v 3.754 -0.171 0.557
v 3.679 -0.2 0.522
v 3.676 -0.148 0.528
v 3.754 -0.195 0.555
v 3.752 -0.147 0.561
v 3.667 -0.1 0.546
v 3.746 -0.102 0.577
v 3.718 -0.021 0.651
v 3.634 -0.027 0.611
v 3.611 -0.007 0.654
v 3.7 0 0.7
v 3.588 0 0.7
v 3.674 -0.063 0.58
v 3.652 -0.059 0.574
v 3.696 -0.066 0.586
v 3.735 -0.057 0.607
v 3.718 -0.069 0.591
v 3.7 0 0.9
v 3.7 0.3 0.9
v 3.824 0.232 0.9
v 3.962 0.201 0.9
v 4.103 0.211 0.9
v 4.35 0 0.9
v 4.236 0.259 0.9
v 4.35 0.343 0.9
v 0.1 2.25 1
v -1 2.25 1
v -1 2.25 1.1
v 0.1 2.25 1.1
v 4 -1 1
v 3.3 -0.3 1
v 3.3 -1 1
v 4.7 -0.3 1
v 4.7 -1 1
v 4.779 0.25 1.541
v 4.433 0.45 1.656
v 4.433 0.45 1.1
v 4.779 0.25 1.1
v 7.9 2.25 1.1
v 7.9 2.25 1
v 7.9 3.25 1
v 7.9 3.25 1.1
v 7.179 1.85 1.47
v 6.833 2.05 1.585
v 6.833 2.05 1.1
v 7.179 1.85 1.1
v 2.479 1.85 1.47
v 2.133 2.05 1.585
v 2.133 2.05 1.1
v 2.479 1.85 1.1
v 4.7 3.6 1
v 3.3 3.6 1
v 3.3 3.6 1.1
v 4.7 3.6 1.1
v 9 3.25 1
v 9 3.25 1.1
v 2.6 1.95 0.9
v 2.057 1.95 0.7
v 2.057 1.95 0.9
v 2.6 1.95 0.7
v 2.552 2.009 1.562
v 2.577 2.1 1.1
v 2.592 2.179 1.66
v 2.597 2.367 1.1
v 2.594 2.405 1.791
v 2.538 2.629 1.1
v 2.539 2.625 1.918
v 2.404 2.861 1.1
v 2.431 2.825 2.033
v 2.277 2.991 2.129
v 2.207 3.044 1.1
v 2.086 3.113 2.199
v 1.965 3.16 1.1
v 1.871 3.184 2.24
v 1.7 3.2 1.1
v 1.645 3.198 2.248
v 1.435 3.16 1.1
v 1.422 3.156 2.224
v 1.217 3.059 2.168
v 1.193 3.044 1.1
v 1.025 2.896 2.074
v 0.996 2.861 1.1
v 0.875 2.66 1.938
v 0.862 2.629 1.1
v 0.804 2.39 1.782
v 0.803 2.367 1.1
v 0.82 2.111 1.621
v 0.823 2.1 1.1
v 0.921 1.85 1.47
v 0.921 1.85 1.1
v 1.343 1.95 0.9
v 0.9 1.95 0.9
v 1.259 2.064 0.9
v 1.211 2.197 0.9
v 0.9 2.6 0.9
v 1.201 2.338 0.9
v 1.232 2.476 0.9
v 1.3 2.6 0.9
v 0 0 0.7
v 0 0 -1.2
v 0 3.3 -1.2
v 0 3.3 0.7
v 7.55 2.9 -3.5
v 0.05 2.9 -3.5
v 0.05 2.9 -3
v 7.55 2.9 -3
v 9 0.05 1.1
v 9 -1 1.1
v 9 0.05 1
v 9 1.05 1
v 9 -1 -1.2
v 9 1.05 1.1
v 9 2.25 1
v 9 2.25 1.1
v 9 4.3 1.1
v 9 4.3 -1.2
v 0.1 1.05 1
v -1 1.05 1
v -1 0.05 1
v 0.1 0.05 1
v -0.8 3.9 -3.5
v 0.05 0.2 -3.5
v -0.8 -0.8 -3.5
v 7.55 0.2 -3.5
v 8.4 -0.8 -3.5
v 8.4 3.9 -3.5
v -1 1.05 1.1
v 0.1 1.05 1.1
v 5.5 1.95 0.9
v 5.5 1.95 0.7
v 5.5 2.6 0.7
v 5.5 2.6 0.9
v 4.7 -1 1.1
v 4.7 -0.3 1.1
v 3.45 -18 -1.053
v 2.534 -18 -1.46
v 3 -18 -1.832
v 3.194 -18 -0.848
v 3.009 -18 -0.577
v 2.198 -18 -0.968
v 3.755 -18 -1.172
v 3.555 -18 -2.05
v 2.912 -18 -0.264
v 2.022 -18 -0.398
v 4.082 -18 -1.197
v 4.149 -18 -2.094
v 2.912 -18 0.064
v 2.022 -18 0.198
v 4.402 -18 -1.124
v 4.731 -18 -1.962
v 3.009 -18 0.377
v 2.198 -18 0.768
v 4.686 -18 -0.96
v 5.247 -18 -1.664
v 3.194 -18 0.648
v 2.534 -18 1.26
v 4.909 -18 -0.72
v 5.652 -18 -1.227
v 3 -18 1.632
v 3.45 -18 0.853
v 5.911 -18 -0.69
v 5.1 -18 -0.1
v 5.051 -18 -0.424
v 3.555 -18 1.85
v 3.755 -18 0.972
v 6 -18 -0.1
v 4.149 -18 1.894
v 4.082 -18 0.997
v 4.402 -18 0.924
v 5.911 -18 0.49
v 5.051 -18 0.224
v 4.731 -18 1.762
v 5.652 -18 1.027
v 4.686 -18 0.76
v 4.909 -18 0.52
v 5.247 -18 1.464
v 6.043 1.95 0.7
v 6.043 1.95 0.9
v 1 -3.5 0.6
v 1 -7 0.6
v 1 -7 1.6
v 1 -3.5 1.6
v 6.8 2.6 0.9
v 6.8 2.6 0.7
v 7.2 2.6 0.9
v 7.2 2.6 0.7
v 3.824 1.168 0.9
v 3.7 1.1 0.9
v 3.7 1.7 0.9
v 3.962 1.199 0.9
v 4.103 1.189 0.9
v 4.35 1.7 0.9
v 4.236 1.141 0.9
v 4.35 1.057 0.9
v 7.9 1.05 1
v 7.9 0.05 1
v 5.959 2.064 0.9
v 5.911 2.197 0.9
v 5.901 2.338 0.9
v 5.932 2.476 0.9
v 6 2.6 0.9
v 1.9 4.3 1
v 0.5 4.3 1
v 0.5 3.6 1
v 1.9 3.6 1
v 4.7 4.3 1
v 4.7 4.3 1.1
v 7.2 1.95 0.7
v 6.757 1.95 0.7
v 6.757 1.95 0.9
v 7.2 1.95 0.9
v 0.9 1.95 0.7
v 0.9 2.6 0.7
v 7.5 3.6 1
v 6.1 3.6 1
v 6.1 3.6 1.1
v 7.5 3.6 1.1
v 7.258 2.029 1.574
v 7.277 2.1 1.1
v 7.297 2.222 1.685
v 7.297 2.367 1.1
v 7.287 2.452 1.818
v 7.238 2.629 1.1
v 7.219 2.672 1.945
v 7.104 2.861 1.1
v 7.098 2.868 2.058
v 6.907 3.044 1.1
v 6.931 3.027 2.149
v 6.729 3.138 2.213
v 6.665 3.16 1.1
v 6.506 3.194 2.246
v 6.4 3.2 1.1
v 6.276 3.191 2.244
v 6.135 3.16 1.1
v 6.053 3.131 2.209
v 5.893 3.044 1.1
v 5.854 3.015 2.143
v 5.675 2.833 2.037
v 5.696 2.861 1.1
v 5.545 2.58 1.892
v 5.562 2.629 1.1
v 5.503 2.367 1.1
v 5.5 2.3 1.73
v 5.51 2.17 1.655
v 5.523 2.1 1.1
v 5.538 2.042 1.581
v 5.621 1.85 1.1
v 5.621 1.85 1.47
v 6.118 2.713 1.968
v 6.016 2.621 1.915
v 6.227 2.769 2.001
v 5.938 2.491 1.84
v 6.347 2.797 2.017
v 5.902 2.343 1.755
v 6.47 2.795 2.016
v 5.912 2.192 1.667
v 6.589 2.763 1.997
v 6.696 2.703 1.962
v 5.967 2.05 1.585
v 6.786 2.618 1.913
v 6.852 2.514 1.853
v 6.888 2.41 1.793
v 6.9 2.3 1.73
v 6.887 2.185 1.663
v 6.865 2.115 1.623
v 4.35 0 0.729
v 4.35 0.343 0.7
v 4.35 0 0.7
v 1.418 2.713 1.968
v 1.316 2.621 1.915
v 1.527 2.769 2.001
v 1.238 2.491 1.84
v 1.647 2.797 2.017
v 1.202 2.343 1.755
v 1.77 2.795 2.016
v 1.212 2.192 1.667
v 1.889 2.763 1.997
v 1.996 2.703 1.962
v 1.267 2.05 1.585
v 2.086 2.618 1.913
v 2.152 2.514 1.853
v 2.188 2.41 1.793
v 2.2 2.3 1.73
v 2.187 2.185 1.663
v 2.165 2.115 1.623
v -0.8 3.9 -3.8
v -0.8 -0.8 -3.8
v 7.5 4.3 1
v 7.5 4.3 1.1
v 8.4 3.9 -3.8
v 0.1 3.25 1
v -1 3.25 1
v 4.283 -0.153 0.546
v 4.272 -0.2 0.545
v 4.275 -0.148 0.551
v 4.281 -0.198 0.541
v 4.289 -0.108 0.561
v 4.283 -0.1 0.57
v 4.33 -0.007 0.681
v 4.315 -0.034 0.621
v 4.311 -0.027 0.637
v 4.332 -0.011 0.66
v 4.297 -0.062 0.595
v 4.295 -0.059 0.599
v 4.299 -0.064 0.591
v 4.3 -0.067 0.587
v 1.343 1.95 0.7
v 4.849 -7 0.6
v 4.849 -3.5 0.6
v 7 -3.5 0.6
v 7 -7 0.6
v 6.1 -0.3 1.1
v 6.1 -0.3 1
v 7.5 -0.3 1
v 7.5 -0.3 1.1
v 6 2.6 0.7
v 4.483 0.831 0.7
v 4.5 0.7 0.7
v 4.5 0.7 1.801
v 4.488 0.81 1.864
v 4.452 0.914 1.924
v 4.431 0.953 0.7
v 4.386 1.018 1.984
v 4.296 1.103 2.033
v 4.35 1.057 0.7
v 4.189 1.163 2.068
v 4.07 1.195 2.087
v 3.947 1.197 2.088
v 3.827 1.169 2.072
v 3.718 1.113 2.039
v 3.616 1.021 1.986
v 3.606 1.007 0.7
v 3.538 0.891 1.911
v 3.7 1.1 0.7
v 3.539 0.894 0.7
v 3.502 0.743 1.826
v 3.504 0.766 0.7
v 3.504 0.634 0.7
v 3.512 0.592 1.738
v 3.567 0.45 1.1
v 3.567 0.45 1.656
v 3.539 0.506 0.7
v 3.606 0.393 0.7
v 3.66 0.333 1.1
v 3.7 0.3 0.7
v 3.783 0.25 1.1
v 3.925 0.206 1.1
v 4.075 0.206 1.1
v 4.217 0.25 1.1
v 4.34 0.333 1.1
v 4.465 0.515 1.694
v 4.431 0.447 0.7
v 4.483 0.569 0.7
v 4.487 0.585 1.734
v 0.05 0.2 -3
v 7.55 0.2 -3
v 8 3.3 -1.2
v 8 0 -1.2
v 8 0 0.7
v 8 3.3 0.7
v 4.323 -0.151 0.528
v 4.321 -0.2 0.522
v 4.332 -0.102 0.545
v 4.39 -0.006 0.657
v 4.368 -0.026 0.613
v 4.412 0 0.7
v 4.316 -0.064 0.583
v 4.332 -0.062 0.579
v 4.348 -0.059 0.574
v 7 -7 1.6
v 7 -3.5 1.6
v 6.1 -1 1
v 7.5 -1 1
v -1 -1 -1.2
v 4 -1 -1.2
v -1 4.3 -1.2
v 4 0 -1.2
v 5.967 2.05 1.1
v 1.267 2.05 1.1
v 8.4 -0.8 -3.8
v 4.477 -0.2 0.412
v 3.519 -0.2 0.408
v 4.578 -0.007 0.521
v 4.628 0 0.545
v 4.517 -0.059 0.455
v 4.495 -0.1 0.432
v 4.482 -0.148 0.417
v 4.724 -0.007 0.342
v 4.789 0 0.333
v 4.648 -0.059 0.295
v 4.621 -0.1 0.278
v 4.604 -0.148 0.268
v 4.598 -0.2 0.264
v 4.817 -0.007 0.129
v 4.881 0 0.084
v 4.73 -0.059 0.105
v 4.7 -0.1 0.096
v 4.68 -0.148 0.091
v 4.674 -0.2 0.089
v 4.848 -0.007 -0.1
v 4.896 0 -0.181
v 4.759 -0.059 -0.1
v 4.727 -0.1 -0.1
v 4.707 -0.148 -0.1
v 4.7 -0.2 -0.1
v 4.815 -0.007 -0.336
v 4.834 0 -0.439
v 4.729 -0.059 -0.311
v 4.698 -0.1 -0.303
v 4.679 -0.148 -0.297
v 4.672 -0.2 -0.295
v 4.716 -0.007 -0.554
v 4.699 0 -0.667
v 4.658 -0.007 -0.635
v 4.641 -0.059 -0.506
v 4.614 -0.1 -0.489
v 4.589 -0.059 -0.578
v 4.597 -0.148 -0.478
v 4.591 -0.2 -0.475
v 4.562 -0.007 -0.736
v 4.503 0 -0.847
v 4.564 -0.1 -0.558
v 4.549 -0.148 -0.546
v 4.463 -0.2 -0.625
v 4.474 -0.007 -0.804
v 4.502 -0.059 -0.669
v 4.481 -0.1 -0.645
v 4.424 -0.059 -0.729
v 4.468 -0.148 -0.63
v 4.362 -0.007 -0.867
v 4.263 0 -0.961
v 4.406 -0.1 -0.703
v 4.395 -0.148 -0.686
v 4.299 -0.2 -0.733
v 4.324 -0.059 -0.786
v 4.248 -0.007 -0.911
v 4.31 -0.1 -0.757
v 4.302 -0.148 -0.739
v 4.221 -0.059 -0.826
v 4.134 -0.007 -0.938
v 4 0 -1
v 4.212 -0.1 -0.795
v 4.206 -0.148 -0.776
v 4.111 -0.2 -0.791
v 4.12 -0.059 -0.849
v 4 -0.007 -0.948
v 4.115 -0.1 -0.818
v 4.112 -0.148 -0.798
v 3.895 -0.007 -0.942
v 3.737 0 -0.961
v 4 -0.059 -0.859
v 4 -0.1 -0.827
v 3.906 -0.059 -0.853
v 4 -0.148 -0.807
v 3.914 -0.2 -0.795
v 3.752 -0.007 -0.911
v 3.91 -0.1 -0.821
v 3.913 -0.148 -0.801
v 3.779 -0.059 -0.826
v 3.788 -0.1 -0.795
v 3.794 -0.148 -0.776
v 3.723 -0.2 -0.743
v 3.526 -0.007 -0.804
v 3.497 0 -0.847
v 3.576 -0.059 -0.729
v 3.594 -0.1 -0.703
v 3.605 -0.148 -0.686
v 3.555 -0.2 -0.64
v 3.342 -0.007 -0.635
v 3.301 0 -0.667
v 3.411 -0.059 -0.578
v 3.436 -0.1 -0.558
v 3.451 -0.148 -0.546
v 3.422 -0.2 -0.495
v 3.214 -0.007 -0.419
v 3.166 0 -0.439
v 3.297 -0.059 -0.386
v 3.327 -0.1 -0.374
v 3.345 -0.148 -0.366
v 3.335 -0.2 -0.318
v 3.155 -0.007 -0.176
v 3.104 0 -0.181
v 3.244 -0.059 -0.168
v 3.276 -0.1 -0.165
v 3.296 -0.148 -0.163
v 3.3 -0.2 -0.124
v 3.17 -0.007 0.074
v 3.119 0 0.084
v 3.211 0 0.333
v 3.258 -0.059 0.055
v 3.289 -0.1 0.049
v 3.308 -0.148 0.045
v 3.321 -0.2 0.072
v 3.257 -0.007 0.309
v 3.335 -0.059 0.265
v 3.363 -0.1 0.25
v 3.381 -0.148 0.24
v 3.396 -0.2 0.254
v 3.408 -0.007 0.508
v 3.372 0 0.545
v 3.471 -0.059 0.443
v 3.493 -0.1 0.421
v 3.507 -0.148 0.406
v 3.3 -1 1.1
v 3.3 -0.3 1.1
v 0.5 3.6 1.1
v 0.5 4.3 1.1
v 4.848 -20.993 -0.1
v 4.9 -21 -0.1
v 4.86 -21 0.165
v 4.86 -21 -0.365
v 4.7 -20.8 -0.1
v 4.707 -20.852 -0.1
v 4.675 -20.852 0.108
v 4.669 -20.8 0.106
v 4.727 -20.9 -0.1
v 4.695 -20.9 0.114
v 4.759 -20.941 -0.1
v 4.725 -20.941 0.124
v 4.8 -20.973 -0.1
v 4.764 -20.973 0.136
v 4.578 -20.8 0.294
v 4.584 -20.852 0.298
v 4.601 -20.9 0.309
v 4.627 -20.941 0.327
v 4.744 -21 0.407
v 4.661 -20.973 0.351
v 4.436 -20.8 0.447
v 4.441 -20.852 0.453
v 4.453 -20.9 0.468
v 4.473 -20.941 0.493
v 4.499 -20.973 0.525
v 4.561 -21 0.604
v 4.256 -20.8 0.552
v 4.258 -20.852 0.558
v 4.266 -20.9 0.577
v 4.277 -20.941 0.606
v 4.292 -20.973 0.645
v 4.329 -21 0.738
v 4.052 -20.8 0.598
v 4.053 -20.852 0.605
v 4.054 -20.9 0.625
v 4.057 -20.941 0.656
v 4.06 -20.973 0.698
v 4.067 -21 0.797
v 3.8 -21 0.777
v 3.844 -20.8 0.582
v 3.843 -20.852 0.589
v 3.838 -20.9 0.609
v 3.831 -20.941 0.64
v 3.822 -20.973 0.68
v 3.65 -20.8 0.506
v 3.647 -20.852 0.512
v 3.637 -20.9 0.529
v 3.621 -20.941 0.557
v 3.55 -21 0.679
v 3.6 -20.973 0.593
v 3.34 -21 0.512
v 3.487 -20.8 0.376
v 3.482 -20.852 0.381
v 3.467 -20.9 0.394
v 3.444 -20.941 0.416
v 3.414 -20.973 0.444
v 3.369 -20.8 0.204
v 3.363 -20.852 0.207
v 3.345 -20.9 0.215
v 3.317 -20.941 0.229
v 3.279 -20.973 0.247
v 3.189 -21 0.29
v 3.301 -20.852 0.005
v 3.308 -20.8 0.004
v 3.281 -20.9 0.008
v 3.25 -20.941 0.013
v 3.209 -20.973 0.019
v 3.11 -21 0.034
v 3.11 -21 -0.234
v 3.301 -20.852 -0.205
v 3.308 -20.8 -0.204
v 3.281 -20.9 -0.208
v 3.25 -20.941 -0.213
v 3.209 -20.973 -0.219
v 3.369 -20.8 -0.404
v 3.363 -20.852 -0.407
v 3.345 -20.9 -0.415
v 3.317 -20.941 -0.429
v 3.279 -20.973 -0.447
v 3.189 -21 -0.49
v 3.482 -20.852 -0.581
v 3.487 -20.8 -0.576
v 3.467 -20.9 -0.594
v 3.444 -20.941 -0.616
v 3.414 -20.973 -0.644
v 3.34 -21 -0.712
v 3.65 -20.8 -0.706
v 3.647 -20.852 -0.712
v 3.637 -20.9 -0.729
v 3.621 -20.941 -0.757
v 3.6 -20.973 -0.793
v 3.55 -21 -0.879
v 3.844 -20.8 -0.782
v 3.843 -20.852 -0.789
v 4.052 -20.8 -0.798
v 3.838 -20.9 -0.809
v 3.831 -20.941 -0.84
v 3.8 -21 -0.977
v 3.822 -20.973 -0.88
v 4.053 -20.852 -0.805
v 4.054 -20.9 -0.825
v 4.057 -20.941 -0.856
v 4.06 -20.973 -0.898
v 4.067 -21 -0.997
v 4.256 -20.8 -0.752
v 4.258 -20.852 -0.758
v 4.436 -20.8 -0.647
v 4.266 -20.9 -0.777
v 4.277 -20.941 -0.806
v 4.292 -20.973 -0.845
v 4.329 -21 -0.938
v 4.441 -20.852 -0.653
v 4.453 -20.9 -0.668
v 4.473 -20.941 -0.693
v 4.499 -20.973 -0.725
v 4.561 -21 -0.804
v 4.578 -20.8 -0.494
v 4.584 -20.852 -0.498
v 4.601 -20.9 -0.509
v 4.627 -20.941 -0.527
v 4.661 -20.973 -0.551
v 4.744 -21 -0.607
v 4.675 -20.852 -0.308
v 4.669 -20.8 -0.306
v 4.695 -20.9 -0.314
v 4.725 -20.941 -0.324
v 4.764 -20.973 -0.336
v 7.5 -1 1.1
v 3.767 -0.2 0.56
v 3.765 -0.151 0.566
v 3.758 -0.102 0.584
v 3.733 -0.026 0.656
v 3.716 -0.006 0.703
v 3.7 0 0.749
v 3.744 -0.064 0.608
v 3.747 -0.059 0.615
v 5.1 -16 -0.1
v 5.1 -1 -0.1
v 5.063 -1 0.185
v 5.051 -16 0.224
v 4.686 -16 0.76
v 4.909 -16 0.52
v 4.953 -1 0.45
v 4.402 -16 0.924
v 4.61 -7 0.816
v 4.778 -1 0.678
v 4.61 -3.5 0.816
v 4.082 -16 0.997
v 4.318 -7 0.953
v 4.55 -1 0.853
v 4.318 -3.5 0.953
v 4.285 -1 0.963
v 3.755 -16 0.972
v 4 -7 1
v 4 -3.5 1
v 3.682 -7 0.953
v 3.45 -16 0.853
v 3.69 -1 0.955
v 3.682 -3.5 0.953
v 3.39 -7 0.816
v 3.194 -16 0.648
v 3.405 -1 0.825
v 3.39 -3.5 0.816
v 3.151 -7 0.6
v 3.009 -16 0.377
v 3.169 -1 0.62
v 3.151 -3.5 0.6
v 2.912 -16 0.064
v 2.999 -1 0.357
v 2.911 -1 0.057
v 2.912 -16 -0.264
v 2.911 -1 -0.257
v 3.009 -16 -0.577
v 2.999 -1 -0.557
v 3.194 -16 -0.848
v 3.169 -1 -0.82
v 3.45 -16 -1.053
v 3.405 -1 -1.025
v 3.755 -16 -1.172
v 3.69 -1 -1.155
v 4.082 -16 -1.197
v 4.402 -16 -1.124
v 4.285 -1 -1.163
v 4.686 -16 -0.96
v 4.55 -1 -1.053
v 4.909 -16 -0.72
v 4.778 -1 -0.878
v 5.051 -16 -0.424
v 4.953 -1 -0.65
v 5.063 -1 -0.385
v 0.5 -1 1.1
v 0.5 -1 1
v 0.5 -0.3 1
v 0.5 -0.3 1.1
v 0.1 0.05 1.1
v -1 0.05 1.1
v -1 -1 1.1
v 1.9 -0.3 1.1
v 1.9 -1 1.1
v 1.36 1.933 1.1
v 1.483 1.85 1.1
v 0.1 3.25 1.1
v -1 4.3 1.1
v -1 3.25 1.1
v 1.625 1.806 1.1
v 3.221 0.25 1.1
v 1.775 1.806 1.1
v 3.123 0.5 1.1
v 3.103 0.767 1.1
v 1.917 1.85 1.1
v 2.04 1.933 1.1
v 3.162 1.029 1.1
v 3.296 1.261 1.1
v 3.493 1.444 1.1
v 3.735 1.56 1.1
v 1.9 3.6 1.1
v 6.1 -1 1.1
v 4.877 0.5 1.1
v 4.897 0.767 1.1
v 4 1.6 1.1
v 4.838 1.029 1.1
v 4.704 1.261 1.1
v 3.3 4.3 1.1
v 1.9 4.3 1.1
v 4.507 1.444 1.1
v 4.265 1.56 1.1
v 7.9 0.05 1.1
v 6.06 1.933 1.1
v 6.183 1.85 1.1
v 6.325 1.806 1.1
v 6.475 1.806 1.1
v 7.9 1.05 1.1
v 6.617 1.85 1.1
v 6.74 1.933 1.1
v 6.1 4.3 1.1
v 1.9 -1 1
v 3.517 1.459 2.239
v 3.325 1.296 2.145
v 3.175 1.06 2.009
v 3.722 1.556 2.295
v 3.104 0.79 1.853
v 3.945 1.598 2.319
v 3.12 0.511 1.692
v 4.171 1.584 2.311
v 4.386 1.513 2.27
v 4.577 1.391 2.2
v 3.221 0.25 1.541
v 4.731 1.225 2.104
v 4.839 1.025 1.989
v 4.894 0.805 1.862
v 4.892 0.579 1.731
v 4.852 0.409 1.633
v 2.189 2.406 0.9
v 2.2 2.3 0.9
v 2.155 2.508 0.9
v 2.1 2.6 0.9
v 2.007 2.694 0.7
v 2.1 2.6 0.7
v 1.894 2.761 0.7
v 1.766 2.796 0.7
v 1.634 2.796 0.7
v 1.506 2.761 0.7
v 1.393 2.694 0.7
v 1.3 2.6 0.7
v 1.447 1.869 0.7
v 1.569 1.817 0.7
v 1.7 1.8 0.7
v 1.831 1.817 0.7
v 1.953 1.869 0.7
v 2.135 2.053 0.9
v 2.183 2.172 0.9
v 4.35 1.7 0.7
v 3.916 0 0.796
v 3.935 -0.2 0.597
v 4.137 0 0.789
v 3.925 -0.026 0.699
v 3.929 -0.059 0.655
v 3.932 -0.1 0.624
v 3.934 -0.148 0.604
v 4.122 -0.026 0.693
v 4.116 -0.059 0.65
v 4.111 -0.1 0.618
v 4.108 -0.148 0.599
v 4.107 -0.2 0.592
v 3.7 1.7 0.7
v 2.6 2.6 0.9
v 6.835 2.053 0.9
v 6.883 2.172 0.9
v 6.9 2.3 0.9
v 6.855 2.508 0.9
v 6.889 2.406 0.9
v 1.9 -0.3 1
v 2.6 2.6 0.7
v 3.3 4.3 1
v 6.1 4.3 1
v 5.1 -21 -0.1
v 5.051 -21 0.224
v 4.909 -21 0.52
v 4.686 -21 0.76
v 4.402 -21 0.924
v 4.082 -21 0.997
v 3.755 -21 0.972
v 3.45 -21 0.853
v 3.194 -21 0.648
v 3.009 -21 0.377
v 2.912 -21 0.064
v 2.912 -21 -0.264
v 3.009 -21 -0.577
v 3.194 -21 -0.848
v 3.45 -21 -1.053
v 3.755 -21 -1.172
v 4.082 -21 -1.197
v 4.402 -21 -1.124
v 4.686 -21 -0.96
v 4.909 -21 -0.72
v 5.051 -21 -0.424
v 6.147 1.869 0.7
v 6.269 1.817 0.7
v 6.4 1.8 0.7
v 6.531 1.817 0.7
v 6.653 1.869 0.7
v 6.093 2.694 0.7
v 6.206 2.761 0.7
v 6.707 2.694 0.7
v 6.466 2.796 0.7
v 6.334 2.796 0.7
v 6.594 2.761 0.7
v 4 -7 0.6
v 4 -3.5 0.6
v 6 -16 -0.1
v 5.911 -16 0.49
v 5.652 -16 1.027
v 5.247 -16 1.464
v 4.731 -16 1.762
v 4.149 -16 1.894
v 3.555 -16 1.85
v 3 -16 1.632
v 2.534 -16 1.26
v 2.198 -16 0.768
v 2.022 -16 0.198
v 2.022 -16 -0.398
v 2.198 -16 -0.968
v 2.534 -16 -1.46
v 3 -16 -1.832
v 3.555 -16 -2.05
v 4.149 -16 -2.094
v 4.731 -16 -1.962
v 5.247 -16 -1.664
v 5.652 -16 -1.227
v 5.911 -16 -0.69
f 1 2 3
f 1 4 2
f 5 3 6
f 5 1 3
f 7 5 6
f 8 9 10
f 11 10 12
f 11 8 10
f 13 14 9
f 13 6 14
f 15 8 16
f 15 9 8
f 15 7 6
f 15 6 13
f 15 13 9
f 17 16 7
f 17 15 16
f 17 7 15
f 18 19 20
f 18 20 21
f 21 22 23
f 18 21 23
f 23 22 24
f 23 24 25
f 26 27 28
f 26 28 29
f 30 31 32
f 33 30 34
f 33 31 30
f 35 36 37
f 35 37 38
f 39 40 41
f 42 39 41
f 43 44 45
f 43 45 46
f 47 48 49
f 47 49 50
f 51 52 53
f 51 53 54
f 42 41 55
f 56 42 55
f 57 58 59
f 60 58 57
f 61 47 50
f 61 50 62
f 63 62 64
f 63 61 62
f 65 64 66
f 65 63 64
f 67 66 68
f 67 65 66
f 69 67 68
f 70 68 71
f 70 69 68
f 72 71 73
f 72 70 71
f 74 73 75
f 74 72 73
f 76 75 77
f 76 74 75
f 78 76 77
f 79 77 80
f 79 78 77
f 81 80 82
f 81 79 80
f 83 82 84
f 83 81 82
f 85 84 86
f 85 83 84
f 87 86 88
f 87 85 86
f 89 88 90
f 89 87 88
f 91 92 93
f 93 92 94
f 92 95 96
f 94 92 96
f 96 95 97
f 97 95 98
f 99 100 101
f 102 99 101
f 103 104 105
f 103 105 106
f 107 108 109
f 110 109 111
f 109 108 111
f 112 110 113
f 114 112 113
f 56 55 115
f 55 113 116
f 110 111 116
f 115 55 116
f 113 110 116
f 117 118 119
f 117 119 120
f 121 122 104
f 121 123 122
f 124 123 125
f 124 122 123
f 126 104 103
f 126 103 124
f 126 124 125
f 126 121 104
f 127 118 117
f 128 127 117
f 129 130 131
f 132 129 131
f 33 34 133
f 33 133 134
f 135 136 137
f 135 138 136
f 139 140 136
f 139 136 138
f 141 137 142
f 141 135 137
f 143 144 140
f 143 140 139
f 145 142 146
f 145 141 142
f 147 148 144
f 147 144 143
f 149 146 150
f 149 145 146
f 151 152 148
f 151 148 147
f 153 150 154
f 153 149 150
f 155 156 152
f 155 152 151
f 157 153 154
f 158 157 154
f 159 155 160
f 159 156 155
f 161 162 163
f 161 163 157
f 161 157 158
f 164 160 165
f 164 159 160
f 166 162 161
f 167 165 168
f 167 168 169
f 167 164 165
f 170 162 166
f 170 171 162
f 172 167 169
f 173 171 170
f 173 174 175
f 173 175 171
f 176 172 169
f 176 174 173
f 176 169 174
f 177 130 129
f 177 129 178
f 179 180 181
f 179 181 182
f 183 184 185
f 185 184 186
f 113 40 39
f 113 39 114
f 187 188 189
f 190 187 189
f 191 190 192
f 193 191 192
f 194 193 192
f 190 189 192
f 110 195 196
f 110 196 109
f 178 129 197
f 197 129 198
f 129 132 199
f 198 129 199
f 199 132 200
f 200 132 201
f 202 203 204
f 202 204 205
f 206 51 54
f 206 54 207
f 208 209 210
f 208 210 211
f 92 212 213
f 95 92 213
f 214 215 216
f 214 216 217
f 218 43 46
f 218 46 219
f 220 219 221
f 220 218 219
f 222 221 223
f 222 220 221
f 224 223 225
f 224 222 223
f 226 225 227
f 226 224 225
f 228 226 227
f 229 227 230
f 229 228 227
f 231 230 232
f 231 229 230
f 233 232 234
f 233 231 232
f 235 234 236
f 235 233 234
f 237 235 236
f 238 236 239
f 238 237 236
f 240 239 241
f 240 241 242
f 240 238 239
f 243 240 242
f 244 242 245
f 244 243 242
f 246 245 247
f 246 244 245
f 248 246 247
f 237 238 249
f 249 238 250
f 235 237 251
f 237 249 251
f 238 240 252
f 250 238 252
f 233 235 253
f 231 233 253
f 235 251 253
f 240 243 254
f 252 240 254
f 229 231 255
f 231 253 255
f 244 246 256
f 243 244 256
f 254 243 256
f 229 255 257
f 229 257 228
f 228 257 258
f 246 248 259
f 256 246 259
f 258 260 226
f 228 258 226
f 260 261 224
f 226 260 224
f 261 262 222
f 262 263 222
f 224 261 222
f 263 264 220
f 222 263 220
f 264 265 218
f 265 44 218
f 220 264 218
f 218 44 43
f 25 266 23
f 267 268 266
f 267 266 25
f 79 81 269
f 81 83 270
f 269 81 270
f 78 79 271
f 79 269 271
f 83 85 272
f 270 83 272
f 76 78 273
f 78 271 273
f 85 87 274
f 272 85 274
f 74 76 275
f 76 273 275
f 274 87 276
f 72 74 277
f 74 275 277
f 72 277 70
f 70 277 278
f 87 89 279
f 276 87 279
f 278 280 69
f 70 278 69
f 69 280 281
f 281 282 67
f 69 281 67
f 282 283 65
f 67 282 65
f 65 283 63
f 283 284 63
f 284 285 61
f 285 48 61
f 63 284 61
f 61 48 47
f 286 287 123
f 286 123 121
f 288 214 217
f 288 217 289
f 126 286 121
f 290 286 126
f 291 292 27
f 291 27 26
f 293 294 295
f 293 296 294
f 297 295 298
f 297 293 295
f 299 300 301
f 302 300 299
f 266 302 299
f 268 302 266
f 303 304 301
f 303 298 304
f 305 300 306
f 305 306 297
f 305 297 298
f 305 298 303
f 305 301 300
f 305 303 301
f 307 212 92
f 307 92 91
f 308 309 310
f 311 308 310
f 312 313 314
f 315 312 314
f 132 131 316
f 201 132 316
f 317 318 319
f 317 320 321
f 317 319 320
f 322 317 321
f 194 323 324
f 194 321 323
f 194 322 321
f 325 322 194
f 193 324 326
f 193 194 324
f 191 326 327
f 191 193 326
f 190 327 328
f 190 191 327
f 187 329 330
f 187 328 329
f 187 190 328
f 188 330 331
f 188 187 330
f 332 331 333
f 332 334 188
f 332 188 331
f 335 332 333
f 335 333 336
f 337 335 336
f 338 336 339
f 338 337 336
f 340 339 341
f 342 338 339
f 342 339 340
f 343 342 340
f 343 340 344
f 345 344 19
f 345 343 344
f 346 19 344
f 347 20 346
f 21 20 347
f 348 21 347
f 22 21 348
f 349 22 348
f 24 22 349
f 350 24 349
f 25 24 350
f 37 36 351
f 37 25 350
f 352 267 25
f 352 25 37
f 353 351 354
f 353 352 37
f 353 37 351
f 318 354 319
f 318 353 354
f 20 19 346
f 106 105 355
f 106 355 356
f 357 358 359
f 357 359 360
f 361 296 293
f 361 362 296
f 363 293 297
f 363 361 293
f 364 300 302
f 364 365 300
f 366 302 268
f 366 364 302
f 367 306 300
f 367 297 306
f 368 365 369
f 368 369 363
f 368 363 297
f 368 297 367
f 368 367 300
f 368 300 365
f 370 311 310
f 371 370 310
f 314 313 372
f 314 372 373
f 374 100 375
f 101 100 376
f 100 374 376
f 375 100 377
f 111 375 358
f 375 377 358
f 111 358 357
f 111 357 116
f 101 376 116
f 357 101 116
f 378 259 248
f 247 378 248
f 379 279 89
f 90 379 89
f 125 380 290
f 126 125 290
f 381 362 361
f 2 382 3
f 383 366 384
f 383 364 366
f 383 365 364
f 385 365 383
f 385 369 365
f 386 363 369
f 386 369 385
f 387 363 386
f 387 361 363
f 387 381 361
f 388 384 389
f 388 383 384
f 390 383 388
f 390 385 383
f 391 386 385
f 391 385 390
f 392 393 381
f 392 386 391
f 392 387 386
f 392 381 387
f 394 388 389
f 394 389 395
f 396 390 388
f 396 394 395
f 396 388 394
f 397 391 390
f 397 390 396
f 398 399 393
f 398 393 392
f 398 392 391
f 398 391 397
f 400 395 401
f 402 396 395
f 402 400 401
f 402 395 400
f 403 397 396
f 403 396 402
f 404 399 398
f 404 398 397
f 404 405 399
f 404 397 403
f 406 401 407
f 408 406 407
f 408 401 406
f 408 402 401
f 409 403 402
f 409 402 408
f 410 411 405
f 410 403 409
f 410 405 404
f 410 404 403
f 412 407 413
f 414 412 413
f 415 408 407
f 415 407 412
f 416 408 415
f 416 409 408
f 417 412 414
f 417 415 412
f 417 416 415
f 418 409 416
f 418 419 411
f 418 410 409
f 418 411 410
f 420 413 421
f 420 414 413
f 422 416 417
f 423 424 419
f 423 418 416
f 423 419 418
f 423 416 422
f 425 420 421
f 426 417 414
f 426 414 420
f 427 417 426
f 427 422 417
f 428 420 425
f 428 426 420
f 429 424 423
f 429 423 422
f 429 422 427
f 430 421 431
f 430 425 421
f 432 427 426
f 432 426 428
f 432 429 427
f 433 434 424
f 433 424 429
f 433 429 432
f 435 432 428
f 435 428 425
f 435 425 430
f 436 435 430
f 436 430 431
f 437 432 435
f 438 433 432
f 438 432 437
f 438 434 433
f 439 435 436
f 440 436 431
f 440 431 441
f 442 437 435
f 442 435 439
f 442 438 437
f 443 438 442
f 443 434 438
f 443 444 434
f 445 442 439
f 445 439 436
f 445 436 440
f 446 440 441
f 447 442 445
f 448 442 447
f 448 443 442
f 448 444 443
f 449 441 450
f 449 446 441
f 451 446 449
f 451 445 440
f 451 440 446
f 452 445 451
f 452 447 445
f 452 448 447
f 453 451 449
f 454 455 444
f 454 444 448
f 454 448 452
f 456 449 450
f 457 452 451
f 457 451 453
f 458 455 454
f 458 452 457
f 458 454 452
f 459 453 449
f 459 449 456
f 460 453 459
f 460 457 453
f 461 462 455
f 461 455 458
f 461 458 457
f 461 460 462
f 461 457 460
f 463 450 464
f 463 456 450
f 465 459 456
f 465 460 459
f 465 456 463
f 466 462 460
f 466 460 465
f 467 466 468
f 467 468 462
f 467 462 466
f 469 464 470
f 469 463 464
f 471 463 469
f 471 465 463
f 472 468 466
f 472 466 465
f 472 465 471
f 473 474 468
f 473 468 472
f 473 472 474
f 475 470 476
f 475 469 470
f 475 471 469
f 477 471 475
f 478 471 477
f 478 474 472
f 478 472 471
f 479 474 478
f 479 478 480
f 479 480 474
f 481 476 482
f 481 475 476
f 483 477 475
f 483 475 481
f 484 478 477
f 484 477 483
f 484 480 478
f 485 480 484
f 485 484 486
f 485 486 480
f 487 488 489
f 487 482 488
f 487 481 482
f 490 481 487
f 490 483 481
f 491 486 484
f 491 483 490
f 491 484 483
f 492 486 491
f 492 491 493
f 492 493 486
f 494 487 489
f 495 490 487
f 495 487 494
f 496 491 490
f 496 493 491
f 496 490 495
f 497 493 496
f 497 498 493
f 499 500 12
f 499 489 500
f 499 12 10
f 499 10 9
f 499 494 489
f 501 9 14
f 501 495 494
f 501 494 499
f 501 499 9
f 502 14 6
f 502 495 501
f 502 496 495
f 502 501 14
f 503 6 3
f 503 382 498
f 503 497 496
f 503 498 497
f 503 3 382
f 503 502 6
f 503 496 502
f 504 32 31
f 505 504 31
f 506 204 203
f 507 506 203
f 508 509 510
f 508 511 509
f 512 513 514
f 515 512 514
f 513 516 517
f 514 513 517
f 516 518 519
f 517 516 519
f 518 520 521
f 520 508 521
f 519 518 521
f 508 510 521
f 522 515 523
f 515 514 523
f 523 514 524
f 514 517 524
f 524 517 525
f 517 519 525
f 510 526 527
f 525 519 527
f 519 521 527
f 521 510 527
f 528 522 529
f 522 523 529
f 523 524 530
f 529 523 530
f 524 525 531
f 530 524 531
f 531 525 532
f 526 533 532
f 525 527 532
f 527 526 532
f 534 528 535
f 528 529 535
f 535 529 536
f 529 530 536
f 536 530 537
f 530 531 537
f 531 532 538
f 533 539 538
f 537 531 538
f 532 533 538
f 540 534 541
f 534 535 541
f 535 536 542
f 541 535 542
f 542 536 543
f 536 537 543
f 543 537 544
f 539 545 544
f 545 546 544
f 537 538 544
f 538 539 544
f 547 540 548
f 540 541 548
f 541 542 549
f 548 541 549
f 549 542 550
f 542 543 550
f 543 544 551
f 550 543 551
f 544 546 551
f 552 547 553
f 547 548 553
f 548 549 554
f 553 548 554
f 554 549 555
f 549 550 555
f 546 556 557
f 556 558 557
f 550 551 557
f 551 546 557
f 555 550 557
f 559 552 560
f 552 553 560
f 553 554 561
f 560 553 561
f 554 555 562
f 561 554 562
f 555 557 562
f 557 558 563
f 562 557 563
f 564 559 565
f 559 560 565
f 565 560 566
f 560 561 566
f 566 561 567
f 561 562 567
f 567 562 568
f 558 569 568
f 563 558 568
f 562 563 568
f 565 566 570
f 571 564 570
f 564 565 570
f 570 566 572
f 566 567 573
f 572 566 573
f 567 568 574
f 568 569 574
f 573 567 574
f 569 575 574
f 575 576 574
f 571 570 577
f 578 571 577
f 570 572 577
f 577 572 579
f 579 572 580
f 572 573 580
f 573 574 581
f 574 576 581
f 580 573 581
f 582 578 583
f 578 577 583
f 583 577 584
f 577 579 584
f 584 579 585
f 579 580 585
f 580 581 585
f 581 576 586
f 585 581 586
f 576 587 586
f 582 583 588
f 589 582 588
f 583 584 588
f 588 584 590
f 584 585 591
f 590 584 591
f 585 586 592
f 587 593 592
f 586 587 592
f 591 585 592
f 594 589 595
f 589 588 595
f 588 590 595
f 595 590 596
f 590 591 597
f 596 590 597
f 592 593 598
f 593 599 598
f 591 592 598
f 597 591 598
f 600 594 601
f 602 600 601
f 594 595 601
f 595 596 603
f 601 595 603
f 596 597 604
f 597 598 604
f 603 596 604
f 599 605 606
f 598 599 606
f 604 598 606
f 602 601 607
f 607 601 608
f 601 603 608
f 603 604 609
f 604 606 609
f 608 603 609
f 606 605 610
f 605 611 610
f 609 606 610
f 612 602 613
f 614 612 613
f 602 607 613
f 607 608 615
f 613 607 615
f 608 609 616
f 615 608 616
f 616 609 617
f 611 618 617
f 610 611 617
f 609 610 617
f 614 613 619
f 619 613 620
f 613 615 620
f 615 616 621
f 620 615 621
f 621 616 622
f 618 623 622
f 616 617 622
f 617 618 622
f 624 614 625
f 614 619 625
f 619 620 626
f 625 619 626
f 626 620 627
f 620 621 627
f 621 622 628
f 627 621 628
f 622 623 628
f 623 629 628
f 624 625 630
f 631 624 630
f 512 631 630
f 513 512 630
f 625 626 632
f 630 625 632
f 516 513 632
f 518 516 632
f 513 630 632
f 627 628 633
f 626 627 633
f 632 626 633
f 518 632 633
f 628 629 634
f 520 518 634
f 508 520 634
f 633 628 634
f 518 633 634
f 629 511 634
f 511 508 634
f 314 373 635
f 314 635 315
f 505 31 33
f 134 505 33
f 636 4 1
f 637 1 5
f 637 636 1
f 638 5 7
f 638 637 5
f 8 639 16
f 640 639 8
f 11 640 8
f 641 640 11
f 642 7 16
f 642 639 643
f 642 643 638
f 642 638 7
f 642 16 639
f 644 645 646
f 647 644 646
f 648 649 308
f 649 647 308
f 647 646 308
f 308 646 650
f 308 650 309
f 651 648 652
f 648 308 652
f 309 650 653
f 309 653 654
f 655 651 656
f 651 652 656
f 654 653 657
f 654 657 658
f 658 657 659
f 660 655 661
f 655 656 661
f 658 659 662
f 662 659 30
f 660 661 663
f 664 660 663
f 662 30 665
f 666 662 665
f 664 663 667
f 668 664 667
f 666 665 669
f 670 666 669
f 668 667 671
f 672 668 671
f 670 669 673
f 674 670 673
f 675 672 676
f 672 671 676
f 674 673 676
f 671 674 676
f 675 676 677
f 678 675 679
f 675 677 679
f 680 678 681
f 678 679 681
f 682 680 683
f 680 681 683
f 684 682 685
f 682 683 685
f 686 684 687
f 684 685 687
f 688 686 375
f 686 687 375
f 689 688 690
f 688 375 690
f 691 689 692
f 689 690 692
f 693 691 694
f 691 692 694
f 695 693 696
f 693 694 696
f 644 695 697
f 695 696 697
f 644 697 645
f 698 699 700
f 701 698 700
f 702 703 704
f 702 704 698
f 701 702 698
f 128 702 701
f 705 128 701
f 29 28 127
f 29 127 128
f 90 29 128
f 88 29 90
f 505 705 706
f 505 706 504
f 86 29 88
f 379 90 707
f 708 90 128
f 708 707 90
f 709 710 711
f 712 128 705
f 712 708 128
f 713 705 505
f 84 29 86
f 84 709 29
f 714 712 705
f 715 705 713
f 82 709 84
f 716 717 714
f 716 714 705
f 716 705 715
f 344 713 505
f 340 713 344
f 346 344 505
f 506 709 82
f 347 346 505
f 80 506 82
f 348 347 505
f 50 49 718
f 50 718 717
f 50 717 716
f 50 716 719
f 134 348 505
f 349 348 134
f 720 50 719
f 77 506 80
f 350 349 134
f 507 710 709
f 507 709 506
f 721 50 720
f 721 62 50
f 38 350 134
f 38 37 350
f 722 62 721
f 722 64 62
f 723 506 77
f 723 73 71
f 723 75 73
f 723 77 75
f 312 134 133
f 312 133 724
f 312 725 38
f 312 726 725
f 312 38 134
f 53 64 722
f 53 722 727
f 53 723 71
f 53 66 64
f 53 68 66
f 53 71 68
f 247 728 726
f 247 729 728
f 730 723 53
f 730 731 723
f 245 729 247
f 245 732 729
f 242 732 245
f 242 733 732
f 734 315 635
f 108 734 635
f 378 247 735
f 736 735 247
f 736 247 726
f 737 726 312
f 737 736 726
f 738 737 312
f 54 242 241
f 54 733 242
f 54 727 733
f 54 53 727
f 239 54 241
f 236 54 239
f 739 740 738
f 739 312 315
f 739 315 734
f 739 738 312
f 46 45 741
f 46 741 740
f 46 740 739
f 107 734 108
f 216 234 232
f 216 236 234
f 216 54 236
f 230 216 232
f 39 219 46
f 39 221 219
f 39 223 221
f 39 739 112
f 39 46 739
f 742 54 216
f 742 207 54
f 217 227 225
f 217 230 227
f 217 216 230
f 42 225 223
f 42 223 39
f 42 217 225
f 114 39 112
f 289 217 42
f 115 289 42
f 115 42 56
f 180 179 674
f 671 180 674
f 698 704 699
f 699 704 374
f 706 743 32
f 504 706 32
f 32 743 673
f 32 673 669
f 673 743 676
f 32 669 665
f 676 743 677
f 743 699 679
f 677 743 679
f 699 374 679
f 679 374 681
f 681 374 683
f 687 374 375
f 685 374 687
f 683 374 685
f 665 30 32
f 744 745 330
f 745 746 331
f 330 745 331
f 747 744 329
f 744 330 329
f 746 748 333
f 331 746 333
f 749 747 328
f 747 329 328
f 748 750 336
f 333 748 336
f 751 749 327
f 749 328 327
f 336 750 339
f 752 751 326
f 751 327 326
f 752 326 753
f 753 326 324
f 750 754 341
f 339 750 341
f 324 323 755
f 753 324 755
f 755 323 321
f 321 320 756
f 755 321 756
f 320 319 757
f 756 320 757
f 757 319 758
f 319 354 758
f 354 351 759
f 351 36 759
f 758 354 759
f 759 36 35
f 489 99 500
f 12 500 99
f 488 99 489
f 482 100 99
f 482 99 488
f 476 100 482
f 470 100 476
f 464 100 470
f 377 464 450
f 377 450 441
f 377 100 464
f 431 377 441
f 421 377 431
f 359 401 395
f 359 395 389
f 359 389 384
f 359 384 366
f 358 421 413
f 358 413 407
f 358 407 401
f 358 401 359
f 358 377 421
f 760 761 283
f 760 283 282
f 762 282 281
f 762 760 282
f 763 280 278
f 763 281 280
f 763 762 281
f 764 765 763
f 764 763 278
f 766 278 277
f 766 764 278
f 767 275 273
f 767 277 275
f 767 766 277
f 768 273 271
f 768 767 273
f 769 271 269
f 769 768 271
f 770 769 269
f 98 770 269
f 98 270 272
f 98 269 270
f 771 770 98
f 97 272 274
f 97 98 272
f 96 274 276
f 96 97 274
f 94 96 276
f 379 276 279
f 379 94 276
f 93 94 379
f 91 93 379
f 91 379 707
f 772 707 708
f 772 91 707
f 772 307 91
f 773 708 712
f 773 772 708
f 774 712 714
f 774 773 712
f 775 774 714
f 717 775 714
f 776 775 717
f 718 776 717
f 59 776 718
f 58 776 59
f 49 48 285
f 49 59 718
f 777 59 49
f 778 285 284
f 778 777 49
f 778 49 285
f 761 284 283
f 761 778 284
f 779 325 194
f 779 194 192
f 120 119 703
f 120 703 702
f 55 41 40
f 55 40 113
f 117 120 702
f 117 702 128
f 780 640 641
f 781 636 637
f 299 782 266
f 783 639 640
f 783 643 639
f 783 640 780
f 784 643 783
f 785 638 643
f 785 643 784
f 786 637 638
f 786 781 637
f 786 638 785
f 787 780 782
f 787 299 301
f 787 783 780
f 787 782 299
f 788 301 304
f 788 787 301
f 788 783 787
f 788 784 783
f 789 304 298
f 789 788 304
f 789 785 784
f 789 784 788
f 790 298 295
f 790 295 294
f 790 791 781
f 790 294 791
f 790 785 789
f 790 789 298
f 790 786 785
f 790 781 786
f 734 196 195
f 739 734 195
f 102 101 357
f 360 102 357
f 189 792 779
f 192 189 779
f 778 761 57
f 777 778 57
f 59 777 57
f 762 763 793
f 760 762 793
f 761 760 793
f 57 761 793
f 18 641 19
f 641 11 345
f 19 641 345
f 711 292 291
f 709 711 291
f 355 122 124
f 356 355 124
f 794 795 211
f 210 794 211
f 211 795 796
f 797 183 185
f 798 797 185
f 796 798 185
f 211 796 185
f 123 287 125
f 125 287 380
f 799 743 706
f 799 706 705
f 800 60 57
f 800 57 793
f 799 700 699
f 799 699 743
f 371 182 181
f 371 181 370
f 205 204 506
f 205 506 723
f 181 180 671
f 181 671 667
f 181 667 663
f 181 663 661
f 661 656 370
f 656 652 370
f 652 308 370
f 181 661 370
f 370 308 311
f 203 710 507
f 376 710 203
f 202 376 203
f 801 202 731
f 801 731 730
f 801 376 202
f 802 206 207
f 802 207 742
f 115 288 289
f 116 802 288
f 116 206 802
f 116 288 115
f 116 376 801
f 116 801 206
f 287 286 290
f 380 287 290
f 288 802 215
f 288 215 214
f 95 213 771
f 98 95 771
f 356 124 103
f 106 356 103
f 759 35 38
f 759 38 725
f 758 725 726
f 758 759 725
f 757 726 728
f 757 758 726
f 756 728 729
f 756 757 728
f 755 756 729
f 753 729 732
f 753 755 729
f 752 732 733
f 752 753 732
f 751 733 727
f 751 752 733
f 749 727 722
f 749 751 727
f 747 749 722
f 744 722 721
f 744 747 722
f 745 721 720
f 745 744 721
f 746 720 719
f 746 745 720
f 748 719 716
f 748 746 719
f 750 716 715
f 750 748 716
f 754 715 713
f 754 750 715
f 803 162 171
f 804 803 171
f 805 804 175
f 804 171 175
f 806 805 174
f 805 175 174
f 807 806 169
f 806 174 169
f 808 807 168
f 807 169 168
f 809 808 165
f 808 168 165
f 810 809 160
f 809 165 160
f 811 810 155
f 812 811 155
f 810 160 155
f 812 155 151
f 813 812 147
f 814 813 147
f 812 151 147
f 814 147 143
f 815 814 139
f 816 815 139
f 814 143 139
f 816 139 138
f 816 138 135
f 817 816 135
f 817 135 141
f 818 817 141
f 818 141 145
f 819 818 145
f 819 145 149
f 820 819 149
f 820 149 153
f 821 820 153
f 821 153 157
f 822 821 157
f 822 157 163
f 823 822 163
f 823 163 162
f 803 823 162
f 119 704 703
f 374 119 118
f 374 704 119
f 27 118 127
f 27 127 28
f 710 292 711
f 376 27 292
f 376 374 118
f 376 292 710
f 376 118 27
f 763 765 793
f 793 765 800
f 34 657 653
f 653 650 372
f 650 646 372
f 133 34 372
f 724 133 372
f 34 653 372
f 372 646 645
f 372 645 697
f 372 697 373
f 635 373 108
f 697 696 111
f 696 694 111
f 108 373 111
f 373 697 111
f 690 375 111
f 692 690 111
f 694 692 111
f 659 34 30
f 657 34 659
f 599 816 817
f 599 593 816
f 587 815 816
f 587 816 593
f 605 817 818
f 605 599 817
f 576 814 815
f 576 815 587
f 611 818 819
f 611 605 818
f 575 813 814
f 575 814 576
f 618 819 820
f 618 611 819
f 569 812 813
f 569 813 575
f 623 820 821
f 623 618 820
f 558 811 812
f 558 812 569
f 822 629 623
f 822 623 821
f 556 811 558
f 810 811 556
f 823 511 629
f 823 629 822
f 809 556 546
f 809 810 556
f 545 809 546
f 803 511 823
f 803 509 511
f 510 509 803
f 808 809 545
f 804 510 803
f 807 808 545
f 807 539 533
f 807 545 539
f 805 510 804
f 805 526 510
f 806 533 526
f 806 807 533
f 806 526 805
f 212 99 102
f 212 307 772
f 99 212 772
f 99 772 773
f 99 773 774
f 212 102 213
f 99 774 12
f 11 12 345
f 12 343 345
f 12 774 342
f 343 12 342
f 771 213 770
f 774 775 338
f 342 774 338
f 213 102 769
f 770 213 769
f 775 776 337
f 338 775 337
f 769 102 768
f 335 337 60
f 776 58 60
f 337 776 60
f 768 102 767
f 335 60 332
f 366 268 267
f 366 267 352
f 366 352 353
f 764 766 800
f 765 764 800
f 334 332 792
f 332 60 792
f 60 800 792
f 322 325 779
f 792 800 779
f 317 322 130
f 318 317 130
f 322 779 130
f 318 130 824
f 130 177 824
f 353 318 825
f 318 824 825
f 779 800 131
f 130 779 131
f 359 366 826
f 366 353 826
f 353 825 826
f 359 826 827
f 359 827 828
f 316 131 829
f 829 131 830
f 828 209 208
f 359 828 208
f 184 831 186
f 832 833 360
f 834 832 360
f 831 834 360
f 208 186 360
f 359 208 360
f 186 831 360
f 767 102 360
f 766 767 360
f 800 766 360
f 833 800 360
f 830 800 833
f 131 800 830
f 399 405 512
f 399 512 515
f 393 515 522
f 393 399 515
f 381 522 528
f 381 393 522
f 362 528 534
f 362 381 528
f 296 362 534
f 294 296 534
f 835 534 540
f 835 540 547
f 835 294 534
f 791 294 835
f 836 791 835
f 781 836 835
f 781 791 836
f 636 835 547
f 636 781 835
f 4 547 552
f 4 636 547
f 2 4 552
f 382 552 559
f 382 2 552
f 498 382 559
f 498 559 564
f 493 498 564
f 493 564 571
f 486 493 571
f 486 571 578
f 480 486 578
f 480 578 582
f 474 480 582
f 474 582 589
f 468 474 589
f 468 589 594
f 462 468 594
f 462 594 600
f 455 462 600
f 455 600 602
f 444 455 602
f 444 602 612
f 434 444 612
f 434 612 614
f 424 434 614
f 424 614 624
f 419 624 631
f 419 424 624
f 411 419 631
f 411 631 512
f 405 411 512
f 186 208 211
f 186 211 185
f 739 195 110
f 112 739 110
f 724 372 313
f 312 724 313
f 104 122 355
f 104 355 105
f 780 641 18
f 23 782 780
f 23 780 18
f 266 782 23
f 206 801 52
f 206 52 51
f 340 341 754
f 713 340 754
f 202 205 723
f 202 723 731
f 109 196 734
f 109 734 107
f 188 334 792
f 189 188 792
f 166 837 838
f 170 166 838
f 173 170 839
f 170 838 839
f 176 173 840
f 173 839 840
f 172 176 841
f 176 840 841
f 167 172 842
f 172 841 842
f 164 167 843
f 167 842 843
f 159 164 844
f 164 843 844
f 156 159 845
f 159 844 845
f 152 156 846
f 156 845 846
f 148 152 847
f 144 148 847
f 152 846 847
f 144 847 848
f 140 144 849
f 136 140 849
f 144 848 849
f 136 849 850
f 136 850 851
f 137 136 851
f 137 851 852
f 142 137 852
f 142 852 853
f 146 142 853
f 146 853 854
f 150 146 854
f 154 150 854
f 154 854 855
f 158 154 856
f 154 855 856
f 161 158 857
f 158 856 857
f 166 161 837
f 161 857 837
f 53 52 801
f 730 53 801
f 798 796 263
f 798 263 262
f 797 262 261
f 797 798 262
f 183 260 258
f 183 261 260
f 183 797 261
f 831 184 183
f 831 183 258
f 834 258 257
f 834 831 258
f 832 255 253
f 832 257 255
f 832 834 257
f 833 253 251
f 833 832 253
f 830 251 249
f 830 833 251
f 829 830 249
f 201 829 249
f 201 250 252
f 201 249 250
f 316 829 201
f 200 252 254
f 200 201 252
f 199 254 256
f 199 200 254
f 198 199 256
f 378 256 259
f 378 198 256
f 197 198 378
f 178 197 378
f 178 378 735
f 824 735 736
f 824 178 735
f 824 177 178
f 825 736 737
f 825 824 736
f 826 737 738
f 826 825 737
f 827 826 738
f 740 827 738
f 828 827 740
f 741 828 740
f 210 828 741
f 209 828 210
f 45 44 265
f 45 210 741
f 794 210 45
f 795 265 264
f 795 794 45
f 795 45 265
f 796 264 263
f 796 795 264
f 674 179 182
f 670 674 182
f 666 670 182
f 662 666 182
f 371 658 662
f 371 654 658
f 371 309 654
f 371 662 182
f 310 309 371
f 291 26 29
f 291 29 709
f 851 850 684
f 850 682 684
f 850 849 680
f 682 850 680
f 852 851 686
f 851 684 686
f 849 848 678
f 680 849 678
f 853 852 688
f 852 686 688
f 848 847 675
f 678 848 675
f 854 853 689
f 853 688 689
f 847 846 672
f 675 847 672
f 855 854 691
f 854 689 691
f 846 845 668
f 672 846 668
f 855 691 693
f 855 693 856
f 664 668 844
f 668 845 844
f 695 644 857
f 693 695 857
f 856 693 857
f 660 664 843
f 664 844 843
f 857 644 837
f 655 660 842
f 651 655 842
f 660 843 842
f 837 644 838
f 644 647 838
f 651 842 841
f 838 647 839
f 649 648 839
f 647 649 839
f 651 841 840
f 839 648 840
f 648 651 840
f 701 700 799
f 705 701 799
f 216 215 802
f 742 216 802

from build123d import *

# Parameters (mm, degrees)
BOX_W                           = 10
BOX_H                           = 5.3
BOX_DEPTH                       = 2.3
CYLINDER001_W                   = 0.9
CYLINDER001_H                   = 3
CYLINDER001_ANGLE               = 240
CYLINDER_R                      = 0.5
CYLINDER_DEPTH                  = 4
CYLINDER002_W                   = 0.9
CYLINDER002_H                   = 3
CYLINDER002_ANGLE               = 240
CYLINDER003_R                   = 0.5
CYLINDER003_DEPTH               = 4
CYLINDER004_W                   = 0.9
CYLINDER004_H                   = 3
CYLINDER004_ANGLE               = 240
CYLINDER005_R                   = 0.5
CYLINDER005_DEPTH               = 4
CYLINDER009_R                   = 1.1
CYLINDER009_DEPTH               = 21
CYLINDER006_R                   = 2
CYLINDER006_DEPTH               = 2
CYLINDER007_R                   = 0.7
CYLINDER007_DEPTH               = 22
BOX003_W                        = 8
BOX003_H                        = 3.3
BOX003_DEPTH                    = 2
BOX004_W                        = 6
BOX004_H                        = 3.5
BOX004_DEPTH                    = 1
BOX005_W                        = 1.4
BOX005_H                        = 0.7
BOX005_DEPTH                    = 0.1
BOX005_LINEARPATTERN_2_W        = 1.4
BOX005_LINEARPATTERN_2_H        = 0.7
BOX005_LINEARPATTERN_2_DEPTH    = 0.1
BOX005_LINEARPATTERN_3_W        = 1.4
BOX005_LINEARPATTERN_3_H        = 0.7
BOX005_LINEARPATTERN_3_DEPTH    = 0.1
LINEARPATTERN001_COUNT          = 2
LINEARPATTERN001_PITCH          = 4.6
BOX006_W                        = 1.1
BOX006_H                        = 1
BOX006_DEPTH                    = 0.2
BOX006_LINEARPATTERN003_2_W     = 1.1
BOX006_LINEARPATTERN003_2_H     = 1
BOX006_LINEARPATTERN003_2_DEPTH = 0.2
LINEARPATTERN004_COUNT          = 2
LINEARPATTERN004_PITCH          = 2.2
BOX007_W                        = 2
BOX007_H                        = 2
BOX007_DEPTH                    = 3.3
BOX008_W                        = 2.2
BOX008_H                        = 2
BOX008_DEPTH                    = 3.3
LINEARPATTERN005_COUNT          = 2
LINEARPATTERN005_PITCH          = 5
BOX009_W                        = 1.7
BOX009_H                        = 0.65
BOX009_DEPTH                    = 1
LINEARPATTERN006_COUNT          = 2
LINEARPATTERN006_PITCH          = 4.6
BOX010_W                        = 0.65
BOX010_H                        = 1.7
BOX010_DEPTH                    = 0.2
FILLET_R                        = 0.2
FILLET001_R                     = 0.2
BOX011_W                        = 9.2
BOX011_H                        = 4.7
BOX011_DEPTH                    = 0.3
BOX012_W                        = 7.5
BOX012_H                        = 2.7
BOX012_DEPTH                    = 0.6


with BuildPart() as body:
    # Box → Box (join)
    with BuildSketch(Plane(origin=(-1, -1, -1.2), x_dir=(1, 0, 0), z_dir=(0, 0, 1))):
        with Locations((5, 2.65)):
            Rectangle(BOX_W, BOX_H)
    extrude(amount=BOX_DEPTH)

    # Cylinder001 → Cylinder001 (revolve)
    with BuildSketch(Plane(origin=(1.7, 2.3, 0.5), x_dir=(0.866025, -0.5, 0), z_dir=(-0.5, -0.866025, 0))):
        with Locations((0.45, 1.5)):
            Rectangle(CYLINDER001_W, CYLINDER001_H)
    revolve(axis=Axis((1.7, 2.3, 0.5), (0, 0, 1)), revolution_arc=CYLINDER001_ANGLE)

    # Cylinder → Cylinder (cut)
    with BuildSketch(Plane(origin=(1.7, 2.3, -1), x_dir=(1, 0, 0), z_dir=(0, 0, 1))):
        Circle(CYLINDER_R)
    extrude(amount=CYLINDER_DEPTH, mode=Mode.SUBTRACT)

    # Cylinder002 → Cylinder002 (revolve)
    with BuildSketch(Plane(origin=(6.4, 2.3, 0.5), x_dir=(0.866025, -0.5, 0), z_dir=(-0.5, -0.866025, 0))):
        with Locations((0.45, 1.5)):
            Rectangle(CYLINDER002_W, CYLINDER002_H)
    revolve(axis=Axis((6.4, 2.3, 0.5), (0, 0, 1)), revolution_arc=CYLINDER002_ANGLE)

    # Cylinder003 → Cylinder003 (cut)
    with BuildSketch(Plane(origin=(6.4, 2.3, -1), x_dir=(1, 0, 0), z_dir=(0, 0, 1))):
        Circle(CYLINDER003_R)
    extrude(amount=CYLINDER003_DEPTH, mode=Mode.SUBTRACT)

    # Cylinder004 → Cylinder004 (revolve)
    with BuildSketch(Plane(origin=(4, 0.7, 0.5), x_dir=(0.866025, -0.5, 0), z_dir=(-0.5, -0.866025, 0))):
        with Locations((0.45, 1.5)):
            Rectangle(CYLINDER004_W, CYLINDER004_H)
    revolve(axis=Axis((4, 0.7, 0.5), (0, 0, 1)), revolution_arc=CYLINDER004_ANGLE)

    # Cylinder005 → Cylinder005 (cut)
    with BuildSketch(Plane(origin=(4, 0.7, -1), x_dir=(1, 0, 0), z_dir=(0, 0, 1))):
        Circle(CYLINDER005_R)
    extrude(amount=CYLINDER005_DEPTH, mode=Mode.SUBTRACT)

    # Cylinder009 → Cylinder009 (join)
    with BuildSketch(Plane(origin=(4, 0, -0.1), x_dir=(1, 0, 0), z_dir=(0, -1, 0))):
        Circle(CYLINDER009_R)
    extrude(amount=CYLINDER009_DEPTH)

    # Cylinder006 → Cylinder006 (join)
    with BuildSketch(Plane(origin=(4, -16, -0.1), x_dir=(1, 0, 0), z_dir=(0, -1, 0))):
        Circle(CYLINDER006_R)
    extrude(amount=CYLINDER006_DEPTH)

    # Cylinder007 → Cylinder007 (cut)
    with BuildSketch(Plane(origin=(4, 1, -0.1), x_dir=(1, 0, 0), z_dir=(0, -1, 0))):
        Circle(CYLINDER007_R)
    extrude(amount=CYLINDER007_DEPTH, mode=Mode.SUBTRACT)

    # Box003 → Box003 (cut)
    with BuildSketch(Plane.XY.offset(-1.3)):
        with Locations((4, 1.65)):
            Rectangle(BOX003_W, BOX003_H)
    extrude(amount=BOX003_DEPTH, mode=Mode.SUBTRACT)

    # Box004 → Box004 (join)
    with BuildSketch(Plane(origin=(1, -7, 0.6), x_dir=(1, 0, 0), z_dir=(0, 0, 1))):
        with Locations((3, 1.75)):
            Rectangle(BOX004_W, BOX004_H)
    extrude(amount=BOX004_DEPTH)

    # Box005 → Box005 (cut)
    with BuildSketch(Plane(origin=(0.5, -1, 1), x_dir=(1, 0, 0), z_dir=(0, 0, 1))):
        with Locations((0.7, 0.35)):
            Rectangle(BOX005_W, BOX005_H)
    box005 = extrude(amount=BOX005_DEPTH, mode=Mode.SUBTRACT)

    # Box005 LinearPattern 2 → Box005 LinearPattern 2 (cut)
    with BuildSketch(Plane(origin=(3.3, -1, 1), x_dir=(1, 0, 0), z_dir=(0, 0, 1))):
        with Locations((0.7, 0.35)):
            Rectangle(BOX005_LINEARPATTERN_2_W, BOX005_LINEARPATTERN_2_H)
    box005_linearpattern_2 = extrude(amount=BOX005_LINEARPATTERN_2_DEPTH, mode=Mode.SUBTRACT)

    # Box005 LinearPattern 3 → Box005 LinearPattern 3 (cut)
    with BuildSketch(Plane(origin=(6.1, -1, 1), x_dir=(1, 0, 0), z_dir=(0, 0, 1))):
        with Locations((0.7, 0.35)):
            Rectangle(BOX005_LINEARPATTERN_3_W, BOX005_LINEARPATTERN_3_H)
    box005_linearpattern_3 = extrude(amount=BOX005_LINEARPATTERN_3_DEPTH, mode=Mode.SUBTRACT)

    # LinearPattern001: Box005, Box005 LinearPattern 2, Box005 LinearPattern 3 ×2
    with Locations(*[(0, i * LINEARPATTERN001_PITCH, 0) for i in range(1, LINEARPATTERN001_COUNT)]):
        add(box005, mode=Mode.SUBTRACT)
        add(box005_linearpattern_2, mode=Mode.SUBTRACT)
        add(box005_linearpattern_3, mode=Mode.SUBTRACT)

    # Box006 → Box006 (cut)
    with BuildSketch(Plane(origin=(-1, 0.05, 1), x_dir=(1, 0, 0), z_dir=(0, 0, 1))):
        with Locations((0.55, 0.5)):
            Rectangle(BOX006_W, BOX006_H)
    box006 = extrude(amount=BOX006_DEPTH, mode=Mode.SUBTRACT)

    # Box006 LinearPattern003 2 → Box006 LinearPattern003 2 (cut)
    with BuildSketch(Plane(origin=(7.9, 0.05, 1), x_dir=(1, 0, 0), z_dir=(0, 0, 1))):
        with Locations((0.55, 0.5)):
            Rectangle(BOX006_LINEARPATTERN003_2_W, BOX006_LINEARPATTERN003_2_H)
    box006_linearpattern003_2 = extrude(amount=BOX006_LINEARPATTERN003_2_DEPTH, mode=Mode.SUBTRACT)

    # LinearPattern004: Box006, Box006 LinearPattern003 2 ×2
    with Locations(*[(0, i * LINEARPATTERN004_PITCH, 0) for i in range(1, LINEARPATTERN004_COUNT)]):
        add(box006, mode=Mode.SUBTRACT)
        add(box006_linearpattern003_2, mode=Mode.SUBTRACT)

    # Box007 → Box007 (cut)
    with BuildSketch(Plane(origin=(3, -1.5, 2.84), x_dir=(1, 0, 0), z_dir=(0, 0.866025, 0.5))):
        with Locations((1, 1)):
            Rectangle(BOX007_W, BOX007_H)
    extrude(amount=BOX007_DEPTH, mode=Mode.SUBTRACT)

    # Box008 → Box008 (cut)
    with BuildSketch(Plane(origin=(0.5, 0.5, 3), x_dir=(1, 0, 0), z_dir=(0, 0.866025, 0.5))):
        with Locations((1.1, 1)):
            Rectangle(BOX008_W, BOX008_H)
    box008 = extrude(amount=BOX008_DEPTH, mode=Mode.SUBTRACT)

    # LinearPattern005: Box008 ×2
    with Locations(*[(i * LINEARPATTERN005_PITCH, 0, 0) for i in range(1, LINEARPATTERN005_COUNT)]):
        add(box008, mode=Mode.SUBTRACT)

    # Box009 → Box009 (cut)
    with BuildSketch(Plane(origin=(0.9, 1.95, -0.1), x_dir=(1, 0, 0), z_dir=(0, 0, 1))):
        with Locations((0.85, 0.325)):
            Rectangle(BOX009_W, BOX009_H)
    box009 = extrude(amount=BOX009_DEPTH, mode=Mode.SUBTRACT)

    # LinearPattern006: Box009 ×2
    with Locations(*[(i * LINEARPATTERN006_PITCH, 0, 0) for i in range(1, LINEARPATTERN006_COUNT)]):
        add(box009, mode=Mode.SUBTRACT)

    # Box010 → Box010 (cut)
    with BuildSketch(Plane(origin=(3.7, 0, 0.7), x_dir=(1, 0, 0), z_dir=(0, 0, 1))):
        with Locations((0.325, 0.85)):
            Rectangle(BOX010_W, BOX010_H)
    extrude(amount=BOX010_DEPTH, mode=Mode.SUBTRACT)

    # Fillet
    fillet_edges = [body.edges().sort_by_distance(p)[0] for p in [
        (3.3, 0, -0.1),
    ]]
    fillet(fillet_edges, radius=FILLET_R)

    # Fillet001
    fillet001_edges = [body.edges().sort_by_distance(p)[0] for p in [
        (3.3, -21, -0.1),
    ]]
    fillet(fillet001_edges, radius=FILLET001_R)


with BuildPart() as body001:
    # Box011 → Box011 (join)
    with BuildSketch(Plane(origin=(-0.8, -0.8, -3.8), x_dir=(1, 0, 0), z_dir=(0, 0, 1))):
        with Locations((4.6, 2.35)):
            Rectangle(BOX011_W, BOX011_H)
    extrude(amount=BOX011_DEPTH)

    # Box012 → Box012 (join)
    with BuildSketch(Plane(origin=(0.05, 0.2, -3.6), x_dir=(1, 0, 0), z_dir=(0, 0, 1))):
        with Locations((3.75, 1.35)):
            Rectangle(BOX012_W, BOX012_H)
    extrude(amount=BOX012_DEPTH)


solid = Compound([body.part, body001.part])
